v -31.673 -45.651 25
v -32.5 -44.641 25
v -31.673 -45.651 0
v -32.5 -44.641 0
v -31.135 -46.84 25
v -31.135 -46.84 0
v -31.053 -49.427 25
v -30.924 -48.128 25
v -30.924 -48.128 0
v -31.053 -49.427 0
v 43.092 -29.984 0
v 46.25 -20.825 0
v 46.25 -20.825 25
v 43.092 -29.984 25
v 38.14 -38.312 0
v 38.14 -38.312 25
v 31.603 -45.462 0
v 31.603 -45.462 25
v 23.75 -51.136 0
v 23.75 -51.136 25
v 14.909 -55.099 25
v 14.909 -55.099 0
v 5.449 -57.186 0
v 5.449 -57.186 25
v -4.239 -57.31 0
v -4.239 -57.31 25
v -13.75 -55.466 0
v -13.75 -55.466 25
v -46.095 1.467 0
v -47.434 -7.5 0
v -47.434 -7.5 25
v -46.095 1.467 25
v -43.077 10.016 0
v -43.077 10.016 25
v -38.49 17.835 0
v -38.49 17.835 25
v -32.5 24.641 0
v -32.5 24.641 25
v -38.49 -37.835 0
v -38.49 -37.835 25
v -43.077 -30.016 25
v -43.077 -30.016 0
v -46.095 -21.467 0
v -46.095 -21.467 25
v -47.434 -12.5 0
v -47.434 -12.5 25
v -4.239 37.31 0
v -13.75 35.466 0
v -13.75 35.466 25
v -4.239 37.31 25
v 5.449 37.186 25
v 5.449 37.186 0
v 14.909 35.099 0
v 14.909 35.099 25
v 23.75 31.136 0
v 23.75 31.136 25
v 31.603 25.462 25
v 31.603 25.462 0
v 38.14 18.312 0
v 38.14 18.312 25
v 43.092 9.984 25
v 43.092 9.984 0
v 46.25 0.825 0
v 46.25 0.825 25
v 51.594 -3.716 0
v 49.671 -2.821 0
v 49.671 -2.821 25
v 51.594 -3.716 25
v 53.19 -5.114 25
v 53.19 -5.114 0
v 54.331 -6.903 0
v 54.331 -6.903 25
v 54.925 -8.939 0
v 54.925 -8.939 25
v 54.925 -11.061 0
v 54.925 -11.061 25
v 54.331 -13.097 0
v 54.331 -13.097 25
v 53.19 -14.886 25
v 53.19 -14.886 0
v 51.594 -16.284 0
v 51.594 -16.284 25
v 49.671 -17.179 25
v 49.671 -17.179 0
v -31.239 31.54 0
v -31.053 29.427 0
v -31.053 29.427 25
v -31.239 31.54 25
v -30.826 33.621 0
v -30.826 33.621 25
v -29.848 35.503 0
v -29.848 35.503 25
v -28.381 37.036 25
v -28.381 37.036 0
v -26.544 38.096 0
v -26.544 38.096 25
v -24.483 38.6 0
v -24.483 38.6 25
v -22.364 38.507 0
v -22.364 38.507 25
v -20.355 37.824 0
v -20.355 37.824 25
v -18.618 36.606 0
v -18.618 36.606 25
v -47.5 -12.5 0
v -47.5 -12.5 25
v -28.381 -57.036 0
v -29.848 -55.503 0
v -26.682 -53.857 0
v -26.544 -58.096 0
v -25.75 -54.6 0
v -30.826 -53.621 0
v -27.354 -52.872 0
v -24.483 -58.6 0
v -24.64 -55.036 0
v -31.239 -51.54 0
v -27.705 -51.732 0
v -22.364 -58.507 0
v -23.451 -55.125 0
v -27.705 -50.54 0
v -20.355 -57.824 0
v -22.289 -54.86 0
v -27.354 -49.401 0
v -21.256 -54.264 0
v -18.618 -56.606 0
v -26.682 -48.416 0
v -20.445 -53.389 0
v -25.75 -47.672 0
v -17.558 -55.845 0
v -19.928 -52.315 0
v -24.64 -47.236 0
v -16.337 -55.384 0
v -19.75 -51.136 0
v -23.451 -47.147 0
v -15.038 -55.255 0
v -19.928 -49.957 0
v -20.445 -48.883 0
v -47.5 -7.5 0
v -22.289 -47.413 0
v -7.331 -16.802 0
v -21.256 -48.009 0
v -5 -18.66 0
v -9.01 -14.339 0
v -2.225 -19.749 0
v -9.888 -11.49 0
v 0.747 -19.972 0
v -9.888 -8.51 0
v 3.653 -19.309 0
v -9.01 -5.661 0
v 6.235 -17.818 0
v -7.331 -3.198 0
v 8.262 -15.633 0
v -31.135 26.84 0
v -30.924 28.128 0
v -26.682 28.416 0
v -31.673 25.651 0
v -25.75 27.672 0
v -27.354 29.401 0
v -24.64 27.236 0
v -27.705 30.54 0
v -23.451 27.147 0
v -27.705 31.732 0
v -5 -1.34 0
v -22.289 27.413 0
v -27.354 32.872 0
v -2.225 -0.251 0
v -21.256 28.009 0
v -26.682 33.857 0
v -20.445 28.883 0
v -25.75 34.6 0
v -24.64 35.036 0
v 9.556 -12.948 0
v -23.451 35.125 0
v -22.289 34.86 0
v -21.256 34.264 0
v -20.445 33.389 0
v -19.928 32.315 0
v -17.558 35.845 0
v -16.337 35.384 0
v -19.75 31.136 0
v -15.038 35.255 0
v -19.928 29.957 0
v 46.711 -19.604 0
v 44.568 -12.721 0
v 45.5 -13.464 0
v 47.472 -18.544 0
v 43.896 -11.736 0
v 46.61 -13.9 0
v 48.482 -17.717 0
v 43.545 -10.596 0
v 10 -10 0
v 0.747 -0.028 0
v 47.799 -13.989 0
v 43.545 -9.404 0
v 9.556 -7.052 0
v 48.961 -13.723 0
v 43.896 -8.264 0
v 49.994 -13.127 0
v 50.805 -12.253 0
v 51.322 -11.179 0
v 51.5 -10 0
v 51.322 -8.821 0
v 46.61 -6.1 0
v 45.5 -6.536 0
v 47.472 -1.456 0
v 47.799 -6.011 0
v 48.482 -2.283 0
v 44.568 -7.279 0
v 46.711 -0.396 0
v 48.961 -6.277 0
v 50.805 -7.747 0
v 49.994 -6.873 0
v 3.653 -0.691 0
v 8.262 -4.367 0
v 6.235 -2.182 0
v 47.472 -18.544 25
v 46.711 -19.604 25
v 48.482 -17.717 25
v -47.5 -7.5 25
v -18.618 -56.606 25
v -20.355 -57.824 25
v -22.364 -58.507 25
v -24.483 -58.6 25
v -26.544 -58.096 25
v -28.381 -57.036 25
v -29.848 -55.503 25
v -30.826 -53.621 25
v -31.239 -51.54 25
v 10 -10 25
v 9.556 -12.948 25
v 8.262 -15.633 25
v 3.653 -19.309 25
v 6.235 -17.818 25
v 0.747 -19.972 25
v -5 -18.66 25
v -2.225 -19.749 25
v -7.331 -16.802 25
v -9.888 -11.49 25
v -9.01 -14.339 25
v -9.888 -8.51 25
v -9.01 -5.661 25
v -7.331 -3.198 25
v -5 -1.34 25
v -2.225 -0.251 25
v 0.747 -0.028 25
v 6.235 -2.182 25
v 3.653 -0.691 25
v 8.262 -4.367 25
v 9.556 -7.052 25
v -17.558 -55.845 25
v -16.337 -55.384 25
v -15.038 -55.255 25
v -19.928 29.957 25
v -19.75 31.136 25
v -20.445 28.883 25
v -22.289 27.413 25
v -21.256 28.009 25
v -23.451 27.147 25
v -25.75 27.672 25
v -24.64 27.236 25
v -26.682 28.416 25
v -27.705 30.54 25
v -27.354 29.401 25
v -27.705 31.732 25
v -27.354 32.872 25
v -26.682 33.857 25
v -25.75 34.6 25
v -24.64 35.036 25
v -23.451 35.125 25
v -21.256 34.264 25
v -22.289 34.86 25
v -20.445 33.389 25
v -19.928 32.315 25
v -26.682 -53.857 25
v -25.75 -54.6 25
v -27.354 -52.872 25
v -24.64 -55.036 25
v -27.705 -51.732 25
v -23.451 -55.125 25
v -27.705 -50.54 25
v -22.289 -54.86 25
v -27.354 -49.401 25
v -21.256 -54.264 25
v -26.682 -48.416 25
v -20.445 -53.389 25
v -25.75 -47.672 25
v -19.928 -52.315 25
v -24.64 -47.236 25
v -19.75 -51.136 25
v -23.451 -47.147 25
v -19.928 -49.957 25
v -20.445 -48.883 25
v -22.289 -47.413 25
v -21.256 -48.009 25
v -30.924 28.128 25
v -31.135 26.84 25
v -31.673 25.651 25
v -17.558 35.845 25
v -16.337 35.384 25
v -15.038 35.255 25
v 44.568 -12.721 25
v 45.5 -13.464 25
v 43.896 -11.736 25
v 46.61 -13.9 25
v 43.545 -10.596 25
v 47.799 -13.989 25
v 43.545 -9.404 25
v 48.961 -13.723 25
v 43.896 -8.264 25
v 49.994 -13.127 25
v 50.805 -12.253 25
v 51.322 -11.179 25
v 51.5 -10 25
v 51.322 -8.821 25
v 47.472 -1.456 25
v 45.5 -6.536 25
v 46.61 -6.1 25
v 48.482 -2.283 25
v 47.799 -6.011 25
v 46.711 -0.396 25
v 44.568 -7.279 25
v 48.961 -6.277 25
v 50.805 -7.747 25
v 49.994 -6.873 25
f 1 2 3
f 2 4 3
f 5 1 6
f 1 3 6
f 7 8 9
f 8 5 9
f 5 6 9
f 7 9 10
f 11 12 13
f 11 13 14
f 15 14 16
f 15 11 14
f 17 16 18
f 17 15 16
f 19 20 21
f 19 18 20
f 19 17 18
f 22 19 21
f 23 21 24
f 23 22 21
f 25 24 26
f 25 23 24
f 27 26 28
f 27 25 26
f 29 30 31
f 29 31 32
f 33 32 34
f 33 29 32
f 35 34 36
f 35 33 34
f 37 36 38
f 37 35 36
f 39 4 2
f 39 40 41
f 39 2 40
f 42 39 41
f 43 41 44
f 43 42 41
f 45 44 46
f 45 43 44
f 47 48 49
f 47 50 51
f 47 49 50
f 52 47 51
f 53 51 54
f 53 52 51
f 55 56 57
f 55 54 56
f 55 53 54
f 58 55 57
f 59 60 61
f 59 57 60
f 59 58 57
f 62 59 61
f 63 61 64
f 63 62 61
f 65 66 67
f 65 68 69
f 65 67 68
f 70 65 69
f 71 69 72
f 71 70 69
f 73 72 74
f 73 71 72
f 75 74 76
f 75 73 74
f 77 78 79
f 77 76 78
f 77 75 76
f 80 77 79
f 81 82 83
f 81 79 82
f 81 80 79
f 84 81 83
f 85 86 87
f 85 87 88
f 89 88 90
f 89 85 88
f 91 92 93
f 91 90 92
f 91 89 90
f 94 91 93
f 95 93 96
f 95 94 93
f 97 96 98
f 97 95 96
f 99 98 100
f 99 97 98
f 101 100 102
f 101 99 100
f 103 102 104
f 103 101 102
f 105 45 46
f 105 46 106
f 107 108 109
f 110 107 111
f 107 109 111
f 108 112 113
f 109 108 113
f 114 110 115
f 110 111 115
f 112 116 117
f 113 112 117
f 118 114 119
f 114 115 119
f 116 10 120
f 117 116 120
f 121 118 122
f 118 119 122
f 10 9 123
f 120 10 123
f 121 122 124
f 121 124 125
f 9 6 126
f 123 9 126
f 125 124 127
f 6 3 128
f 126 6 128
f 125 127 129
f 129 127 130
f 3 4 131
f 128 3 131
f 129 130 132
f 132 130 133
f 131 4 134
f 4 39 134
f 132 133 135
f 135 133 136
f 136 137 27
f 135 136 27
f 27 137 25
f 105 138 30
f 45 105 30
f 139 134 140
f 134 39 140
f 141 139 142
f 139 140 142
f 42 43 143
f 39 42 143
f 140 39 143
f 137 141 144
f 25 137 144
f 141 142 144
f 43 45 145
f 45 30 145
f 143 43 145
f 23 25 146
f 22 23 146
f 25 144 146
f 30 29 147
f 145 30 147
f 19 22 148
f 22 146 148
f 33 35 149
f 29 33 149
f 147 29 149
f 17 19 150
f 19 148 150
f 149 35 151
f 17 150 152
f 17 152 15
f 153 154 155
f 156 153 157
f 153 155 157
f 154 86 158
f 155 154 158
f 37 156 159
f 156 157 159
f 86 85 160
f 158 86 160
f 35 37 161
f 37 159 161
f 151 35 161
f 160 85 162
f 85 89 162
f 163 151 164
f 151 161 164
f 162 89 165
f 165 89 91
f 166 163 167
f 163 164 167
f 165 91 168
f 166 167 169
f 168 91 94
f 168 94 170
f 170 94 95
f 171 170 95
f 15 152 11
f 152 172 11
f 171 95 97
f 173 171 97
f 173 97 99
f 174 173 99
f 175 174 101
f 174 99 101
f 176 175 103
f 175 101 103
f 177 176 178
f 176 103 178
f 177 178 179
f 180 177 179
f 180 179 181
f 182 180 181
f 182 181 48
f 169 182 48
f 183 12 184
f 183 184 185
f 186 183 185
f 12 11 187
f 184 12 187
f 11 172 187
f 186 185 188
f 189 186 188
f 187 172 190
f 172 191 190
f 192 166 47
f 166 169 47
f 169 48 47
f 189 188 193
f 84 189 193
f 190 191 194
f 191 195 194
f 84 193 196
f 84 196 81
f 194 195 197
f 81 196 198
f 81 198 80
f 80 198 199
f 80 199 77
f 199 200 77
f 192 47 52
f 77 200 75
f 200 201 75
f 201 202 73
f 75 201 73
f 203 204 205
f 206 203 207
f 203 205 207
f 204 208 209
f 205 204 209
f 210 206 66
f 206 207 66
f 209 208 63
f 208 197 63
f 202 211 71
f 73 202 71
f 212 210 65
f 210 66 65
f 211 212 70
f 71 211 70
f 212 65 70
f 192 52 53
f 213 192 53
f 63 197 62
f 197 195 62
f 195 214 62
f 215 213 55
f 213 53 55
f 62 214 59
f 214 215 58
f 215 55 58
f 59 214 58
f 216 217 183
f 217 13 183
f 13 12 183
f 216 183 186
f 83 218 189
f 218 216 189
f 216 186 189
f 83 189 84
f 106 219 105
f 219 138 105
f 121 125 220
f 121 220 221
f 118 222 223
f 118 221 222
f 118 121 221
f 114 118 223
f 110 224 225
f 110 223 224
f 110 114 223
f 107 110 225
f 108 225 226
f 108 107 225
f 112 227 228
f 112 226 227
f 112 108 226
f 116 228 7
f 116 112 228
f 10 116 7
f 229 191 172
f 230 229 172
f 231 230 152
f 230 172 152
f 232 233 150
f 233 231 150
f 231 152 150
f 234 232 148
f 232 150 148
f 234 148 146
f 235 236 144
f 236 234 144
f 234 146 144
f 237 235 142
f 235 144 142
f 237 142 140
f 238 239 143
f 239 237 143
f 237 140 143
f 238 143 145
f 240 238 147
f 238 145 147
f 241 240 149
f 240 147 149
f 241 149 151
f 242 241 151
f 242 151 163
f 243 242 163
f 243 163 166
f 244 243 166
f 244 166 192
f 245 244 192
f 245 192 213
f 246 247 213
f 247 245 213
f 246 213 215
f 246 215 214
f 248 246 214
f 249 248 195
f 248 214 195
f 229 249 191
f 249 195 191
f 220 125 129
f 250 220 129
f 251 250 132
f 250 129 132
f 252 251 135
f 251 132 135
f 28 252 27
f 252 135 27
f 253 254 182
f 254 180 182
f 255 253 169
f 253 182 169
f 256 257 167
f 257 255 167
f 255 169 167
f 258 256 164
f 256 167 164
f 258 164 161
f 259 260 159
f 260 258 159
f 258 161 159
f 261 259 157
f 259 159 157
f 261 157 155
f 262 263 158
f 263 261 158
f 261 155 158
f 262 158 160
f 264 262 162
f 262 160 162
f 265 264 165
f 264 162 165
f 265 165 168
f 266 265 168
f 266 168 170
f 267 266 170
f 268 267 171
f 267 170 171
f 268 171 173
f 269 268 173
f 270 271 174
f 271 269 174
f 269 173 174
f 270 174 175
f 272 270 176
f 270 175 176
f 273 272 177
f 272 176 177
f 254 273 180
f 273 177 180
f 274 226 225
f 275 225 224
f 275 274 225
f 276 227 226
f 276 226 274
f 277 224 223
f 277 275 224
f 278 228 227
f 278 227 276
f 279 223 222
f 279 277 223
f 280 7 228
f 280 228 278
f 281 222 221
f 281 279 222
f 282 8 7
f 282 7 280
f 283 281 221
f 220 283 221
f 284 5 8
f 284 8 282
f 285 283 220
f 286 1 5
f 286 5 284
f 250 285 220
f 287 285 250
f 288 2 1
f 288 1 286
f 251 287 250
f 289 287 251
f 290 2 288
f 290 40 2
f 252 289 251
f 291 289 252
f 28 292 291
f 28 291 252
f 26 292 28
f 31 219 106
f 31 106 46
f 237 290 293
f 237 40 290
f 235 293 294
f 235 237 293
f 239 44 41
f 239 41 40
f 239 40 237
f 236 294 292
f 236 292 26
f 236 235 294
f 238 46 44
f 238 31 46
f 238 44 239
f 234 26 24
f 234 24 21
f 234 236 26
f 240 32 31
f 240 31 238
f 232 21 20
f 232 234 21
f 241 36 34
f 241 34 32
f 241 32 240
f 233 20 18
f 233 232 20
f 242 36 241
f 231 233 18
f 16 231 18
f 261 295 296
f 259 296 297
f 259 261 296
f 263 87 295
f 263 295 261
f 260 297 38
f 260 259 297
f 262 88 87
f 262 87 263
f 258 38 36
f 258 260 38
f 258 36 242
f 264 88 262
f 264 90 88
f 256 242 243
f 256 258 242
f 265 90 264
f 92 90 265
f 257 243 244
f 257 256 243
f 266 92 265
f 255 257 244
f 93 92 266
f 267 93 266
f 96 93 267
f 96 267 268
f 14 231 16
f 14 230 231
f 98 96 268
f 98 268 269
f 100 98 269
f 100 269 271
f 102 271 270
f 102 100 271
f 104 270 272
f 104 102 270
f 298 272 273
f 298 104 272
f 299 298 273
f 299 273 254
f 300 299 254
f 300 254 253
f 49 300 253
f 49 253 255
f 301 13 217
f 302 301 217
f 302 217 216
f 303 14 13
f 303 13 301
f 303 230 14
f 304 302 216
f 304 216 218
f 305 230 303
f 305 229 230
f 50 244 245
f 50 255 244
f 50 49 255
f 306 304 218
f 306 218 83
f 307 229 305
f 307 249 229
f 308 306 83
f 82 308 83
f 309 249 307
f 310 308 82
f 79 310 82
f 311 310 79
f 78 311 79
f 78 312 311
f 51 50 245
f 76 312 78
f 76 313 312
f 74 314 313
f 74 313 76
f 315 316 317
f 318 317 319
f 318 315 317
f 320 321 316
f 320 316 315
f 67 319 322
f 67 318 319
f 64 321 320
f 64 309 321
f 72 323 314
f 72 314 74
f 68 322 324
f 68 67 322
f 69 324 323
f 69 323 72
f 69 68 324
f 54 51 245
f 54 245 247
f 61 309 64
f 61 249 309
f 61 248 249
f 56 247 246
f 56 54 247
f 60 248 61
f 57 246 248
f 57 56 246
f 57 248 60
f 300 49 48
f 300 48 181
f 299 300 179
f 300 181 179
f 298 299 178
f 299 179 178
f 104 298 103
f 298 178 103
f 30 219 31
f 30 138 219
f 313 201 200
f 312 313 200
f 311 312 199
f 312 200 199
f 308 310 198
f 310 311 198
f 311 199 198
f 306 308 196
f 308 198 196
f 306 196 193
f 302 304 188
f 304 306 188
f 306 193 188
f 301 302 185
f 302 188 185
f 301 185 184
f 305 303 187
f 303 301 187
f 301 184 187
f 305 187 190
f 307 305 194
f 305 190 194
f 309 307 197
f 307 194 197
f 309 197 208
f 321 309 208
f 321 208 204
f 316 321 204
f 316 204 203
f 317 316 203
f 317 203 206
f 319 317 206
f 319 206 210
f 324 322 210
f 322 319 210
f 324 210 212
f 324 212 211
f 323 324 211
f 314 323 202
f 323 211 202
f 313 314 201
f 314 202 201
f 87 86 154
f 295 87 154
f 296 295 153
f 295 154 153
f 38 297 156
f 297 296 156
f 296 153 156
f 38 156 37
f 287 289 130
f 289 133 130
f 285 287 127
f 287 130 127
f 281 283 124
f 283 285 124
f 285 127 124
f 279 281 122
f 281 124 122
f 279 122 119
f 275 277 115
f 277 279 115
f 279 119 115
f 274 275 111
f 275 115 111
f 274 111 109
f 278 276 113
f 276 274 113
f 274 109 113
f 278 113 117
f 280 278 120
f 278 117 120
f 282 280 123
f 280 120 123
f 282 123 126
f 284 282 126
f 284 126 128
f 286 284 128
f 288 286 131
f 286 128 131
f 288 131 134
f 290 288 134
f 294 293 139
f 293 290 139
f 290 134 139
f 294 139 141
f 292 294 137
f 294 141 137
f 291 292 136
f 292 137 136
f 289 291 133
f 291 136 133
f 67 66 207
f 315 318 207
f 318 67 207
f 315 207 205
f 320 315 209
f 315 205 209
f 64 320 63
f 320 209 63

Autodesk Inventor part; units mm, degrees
ref_plane "YZ Plane" through (0, 0, 0) normal (1, 0, 0) x (0, 1, 0)
ref_plane "XZ Plane" through (0, 0, 0) normal (0, 1, 0) x (-1, 0, 0)
sketch "Sketch1" plane through (0, 0, 0) normal (0, 0, 1) x (1, 0, 0)
  circle A0 centre (0, -10) radius 10 projected
  circle A1 centre (47.5, -10) radius 4 projected
  arc A2 (-13.75, -55.4663) -> (46.25, -20.8253) centre (0, -10) ccw projected
  arc A3 (49.6711, -17.1789) -> (46.25, -20.8253) centre (51.1184, -21.9648) ccw projected
  arc A4 (49.6711, -17.1789) -> (49.6711, -2.8211) centre (47.5, -10) ccw projected
  arc A5 (46.25, 0.8253) -> (49.6711, -2.8211) centre (51.1184, 1.9648) ccw projected
  arc A6 (46.25, 0.8253) -> (-13.75, 35.4663) centre (0, -10) ccw projected
  arc A7 (-18.6184, 36.6058) -> (-13.75, 35.4663) centre (-15.1974, 40.2523) ccw projected
  arc A8 (-18.6184, 36.6058) -> (-31.0526, 29.4269) centre (-23.75, 31.1362) ccw projected
  arc A9 (-32.5, 24.641) -> (-31.0526, 29.4269) centre (-35.9211, 28.2874) ccw projected
  arc A10 (-32.5, 24.641) -> (-47.4342, -7.5) centre (0, -10) ccw projected
  line L0 (-47.5, -7.5) -> (-47.4342, -7.5) projected
  line L1 (-47.5, -7.5) -> (-47.5, -12.5) projected
  line L2 (-47.4342, -12.5) -> (-47.5, -12.5) projected
  arc A11 (-47.4342, -12.5) -> (-32.5, -44.641) centre (0, -10) ccw projected
  arc A12 (-31.0526, -49.4269) -> (-32.5, -44.641) centre (-35.9211, -48.2874) ccw projected
  arc A13 (-31.0526, -49.4269) -> (-18.6184, -56.6058) centre (-23.75, -51.1362) ccw projected
  arc A14 (-13.75, -55.4663) -> (-18.6184, -56.6058) centre (-15.1974, -60.2523) ccw projected
  circle A15 centre (-23.75, 31.1362) radius 4 projected
  circle A16 centre (-23.75, -51.1362) radius 4 projected
  point P0 (0, 0)
ref_plane "Work Plane1" through (-44.1783, -54.1783, 25) normal (0, 0, -1) x (0.3122, 0.95, 0)
extrude "Extrusion1" add sketch "Sketch1" along normal up to surface (25 mm away)
properties part number "Motor Spacer"
